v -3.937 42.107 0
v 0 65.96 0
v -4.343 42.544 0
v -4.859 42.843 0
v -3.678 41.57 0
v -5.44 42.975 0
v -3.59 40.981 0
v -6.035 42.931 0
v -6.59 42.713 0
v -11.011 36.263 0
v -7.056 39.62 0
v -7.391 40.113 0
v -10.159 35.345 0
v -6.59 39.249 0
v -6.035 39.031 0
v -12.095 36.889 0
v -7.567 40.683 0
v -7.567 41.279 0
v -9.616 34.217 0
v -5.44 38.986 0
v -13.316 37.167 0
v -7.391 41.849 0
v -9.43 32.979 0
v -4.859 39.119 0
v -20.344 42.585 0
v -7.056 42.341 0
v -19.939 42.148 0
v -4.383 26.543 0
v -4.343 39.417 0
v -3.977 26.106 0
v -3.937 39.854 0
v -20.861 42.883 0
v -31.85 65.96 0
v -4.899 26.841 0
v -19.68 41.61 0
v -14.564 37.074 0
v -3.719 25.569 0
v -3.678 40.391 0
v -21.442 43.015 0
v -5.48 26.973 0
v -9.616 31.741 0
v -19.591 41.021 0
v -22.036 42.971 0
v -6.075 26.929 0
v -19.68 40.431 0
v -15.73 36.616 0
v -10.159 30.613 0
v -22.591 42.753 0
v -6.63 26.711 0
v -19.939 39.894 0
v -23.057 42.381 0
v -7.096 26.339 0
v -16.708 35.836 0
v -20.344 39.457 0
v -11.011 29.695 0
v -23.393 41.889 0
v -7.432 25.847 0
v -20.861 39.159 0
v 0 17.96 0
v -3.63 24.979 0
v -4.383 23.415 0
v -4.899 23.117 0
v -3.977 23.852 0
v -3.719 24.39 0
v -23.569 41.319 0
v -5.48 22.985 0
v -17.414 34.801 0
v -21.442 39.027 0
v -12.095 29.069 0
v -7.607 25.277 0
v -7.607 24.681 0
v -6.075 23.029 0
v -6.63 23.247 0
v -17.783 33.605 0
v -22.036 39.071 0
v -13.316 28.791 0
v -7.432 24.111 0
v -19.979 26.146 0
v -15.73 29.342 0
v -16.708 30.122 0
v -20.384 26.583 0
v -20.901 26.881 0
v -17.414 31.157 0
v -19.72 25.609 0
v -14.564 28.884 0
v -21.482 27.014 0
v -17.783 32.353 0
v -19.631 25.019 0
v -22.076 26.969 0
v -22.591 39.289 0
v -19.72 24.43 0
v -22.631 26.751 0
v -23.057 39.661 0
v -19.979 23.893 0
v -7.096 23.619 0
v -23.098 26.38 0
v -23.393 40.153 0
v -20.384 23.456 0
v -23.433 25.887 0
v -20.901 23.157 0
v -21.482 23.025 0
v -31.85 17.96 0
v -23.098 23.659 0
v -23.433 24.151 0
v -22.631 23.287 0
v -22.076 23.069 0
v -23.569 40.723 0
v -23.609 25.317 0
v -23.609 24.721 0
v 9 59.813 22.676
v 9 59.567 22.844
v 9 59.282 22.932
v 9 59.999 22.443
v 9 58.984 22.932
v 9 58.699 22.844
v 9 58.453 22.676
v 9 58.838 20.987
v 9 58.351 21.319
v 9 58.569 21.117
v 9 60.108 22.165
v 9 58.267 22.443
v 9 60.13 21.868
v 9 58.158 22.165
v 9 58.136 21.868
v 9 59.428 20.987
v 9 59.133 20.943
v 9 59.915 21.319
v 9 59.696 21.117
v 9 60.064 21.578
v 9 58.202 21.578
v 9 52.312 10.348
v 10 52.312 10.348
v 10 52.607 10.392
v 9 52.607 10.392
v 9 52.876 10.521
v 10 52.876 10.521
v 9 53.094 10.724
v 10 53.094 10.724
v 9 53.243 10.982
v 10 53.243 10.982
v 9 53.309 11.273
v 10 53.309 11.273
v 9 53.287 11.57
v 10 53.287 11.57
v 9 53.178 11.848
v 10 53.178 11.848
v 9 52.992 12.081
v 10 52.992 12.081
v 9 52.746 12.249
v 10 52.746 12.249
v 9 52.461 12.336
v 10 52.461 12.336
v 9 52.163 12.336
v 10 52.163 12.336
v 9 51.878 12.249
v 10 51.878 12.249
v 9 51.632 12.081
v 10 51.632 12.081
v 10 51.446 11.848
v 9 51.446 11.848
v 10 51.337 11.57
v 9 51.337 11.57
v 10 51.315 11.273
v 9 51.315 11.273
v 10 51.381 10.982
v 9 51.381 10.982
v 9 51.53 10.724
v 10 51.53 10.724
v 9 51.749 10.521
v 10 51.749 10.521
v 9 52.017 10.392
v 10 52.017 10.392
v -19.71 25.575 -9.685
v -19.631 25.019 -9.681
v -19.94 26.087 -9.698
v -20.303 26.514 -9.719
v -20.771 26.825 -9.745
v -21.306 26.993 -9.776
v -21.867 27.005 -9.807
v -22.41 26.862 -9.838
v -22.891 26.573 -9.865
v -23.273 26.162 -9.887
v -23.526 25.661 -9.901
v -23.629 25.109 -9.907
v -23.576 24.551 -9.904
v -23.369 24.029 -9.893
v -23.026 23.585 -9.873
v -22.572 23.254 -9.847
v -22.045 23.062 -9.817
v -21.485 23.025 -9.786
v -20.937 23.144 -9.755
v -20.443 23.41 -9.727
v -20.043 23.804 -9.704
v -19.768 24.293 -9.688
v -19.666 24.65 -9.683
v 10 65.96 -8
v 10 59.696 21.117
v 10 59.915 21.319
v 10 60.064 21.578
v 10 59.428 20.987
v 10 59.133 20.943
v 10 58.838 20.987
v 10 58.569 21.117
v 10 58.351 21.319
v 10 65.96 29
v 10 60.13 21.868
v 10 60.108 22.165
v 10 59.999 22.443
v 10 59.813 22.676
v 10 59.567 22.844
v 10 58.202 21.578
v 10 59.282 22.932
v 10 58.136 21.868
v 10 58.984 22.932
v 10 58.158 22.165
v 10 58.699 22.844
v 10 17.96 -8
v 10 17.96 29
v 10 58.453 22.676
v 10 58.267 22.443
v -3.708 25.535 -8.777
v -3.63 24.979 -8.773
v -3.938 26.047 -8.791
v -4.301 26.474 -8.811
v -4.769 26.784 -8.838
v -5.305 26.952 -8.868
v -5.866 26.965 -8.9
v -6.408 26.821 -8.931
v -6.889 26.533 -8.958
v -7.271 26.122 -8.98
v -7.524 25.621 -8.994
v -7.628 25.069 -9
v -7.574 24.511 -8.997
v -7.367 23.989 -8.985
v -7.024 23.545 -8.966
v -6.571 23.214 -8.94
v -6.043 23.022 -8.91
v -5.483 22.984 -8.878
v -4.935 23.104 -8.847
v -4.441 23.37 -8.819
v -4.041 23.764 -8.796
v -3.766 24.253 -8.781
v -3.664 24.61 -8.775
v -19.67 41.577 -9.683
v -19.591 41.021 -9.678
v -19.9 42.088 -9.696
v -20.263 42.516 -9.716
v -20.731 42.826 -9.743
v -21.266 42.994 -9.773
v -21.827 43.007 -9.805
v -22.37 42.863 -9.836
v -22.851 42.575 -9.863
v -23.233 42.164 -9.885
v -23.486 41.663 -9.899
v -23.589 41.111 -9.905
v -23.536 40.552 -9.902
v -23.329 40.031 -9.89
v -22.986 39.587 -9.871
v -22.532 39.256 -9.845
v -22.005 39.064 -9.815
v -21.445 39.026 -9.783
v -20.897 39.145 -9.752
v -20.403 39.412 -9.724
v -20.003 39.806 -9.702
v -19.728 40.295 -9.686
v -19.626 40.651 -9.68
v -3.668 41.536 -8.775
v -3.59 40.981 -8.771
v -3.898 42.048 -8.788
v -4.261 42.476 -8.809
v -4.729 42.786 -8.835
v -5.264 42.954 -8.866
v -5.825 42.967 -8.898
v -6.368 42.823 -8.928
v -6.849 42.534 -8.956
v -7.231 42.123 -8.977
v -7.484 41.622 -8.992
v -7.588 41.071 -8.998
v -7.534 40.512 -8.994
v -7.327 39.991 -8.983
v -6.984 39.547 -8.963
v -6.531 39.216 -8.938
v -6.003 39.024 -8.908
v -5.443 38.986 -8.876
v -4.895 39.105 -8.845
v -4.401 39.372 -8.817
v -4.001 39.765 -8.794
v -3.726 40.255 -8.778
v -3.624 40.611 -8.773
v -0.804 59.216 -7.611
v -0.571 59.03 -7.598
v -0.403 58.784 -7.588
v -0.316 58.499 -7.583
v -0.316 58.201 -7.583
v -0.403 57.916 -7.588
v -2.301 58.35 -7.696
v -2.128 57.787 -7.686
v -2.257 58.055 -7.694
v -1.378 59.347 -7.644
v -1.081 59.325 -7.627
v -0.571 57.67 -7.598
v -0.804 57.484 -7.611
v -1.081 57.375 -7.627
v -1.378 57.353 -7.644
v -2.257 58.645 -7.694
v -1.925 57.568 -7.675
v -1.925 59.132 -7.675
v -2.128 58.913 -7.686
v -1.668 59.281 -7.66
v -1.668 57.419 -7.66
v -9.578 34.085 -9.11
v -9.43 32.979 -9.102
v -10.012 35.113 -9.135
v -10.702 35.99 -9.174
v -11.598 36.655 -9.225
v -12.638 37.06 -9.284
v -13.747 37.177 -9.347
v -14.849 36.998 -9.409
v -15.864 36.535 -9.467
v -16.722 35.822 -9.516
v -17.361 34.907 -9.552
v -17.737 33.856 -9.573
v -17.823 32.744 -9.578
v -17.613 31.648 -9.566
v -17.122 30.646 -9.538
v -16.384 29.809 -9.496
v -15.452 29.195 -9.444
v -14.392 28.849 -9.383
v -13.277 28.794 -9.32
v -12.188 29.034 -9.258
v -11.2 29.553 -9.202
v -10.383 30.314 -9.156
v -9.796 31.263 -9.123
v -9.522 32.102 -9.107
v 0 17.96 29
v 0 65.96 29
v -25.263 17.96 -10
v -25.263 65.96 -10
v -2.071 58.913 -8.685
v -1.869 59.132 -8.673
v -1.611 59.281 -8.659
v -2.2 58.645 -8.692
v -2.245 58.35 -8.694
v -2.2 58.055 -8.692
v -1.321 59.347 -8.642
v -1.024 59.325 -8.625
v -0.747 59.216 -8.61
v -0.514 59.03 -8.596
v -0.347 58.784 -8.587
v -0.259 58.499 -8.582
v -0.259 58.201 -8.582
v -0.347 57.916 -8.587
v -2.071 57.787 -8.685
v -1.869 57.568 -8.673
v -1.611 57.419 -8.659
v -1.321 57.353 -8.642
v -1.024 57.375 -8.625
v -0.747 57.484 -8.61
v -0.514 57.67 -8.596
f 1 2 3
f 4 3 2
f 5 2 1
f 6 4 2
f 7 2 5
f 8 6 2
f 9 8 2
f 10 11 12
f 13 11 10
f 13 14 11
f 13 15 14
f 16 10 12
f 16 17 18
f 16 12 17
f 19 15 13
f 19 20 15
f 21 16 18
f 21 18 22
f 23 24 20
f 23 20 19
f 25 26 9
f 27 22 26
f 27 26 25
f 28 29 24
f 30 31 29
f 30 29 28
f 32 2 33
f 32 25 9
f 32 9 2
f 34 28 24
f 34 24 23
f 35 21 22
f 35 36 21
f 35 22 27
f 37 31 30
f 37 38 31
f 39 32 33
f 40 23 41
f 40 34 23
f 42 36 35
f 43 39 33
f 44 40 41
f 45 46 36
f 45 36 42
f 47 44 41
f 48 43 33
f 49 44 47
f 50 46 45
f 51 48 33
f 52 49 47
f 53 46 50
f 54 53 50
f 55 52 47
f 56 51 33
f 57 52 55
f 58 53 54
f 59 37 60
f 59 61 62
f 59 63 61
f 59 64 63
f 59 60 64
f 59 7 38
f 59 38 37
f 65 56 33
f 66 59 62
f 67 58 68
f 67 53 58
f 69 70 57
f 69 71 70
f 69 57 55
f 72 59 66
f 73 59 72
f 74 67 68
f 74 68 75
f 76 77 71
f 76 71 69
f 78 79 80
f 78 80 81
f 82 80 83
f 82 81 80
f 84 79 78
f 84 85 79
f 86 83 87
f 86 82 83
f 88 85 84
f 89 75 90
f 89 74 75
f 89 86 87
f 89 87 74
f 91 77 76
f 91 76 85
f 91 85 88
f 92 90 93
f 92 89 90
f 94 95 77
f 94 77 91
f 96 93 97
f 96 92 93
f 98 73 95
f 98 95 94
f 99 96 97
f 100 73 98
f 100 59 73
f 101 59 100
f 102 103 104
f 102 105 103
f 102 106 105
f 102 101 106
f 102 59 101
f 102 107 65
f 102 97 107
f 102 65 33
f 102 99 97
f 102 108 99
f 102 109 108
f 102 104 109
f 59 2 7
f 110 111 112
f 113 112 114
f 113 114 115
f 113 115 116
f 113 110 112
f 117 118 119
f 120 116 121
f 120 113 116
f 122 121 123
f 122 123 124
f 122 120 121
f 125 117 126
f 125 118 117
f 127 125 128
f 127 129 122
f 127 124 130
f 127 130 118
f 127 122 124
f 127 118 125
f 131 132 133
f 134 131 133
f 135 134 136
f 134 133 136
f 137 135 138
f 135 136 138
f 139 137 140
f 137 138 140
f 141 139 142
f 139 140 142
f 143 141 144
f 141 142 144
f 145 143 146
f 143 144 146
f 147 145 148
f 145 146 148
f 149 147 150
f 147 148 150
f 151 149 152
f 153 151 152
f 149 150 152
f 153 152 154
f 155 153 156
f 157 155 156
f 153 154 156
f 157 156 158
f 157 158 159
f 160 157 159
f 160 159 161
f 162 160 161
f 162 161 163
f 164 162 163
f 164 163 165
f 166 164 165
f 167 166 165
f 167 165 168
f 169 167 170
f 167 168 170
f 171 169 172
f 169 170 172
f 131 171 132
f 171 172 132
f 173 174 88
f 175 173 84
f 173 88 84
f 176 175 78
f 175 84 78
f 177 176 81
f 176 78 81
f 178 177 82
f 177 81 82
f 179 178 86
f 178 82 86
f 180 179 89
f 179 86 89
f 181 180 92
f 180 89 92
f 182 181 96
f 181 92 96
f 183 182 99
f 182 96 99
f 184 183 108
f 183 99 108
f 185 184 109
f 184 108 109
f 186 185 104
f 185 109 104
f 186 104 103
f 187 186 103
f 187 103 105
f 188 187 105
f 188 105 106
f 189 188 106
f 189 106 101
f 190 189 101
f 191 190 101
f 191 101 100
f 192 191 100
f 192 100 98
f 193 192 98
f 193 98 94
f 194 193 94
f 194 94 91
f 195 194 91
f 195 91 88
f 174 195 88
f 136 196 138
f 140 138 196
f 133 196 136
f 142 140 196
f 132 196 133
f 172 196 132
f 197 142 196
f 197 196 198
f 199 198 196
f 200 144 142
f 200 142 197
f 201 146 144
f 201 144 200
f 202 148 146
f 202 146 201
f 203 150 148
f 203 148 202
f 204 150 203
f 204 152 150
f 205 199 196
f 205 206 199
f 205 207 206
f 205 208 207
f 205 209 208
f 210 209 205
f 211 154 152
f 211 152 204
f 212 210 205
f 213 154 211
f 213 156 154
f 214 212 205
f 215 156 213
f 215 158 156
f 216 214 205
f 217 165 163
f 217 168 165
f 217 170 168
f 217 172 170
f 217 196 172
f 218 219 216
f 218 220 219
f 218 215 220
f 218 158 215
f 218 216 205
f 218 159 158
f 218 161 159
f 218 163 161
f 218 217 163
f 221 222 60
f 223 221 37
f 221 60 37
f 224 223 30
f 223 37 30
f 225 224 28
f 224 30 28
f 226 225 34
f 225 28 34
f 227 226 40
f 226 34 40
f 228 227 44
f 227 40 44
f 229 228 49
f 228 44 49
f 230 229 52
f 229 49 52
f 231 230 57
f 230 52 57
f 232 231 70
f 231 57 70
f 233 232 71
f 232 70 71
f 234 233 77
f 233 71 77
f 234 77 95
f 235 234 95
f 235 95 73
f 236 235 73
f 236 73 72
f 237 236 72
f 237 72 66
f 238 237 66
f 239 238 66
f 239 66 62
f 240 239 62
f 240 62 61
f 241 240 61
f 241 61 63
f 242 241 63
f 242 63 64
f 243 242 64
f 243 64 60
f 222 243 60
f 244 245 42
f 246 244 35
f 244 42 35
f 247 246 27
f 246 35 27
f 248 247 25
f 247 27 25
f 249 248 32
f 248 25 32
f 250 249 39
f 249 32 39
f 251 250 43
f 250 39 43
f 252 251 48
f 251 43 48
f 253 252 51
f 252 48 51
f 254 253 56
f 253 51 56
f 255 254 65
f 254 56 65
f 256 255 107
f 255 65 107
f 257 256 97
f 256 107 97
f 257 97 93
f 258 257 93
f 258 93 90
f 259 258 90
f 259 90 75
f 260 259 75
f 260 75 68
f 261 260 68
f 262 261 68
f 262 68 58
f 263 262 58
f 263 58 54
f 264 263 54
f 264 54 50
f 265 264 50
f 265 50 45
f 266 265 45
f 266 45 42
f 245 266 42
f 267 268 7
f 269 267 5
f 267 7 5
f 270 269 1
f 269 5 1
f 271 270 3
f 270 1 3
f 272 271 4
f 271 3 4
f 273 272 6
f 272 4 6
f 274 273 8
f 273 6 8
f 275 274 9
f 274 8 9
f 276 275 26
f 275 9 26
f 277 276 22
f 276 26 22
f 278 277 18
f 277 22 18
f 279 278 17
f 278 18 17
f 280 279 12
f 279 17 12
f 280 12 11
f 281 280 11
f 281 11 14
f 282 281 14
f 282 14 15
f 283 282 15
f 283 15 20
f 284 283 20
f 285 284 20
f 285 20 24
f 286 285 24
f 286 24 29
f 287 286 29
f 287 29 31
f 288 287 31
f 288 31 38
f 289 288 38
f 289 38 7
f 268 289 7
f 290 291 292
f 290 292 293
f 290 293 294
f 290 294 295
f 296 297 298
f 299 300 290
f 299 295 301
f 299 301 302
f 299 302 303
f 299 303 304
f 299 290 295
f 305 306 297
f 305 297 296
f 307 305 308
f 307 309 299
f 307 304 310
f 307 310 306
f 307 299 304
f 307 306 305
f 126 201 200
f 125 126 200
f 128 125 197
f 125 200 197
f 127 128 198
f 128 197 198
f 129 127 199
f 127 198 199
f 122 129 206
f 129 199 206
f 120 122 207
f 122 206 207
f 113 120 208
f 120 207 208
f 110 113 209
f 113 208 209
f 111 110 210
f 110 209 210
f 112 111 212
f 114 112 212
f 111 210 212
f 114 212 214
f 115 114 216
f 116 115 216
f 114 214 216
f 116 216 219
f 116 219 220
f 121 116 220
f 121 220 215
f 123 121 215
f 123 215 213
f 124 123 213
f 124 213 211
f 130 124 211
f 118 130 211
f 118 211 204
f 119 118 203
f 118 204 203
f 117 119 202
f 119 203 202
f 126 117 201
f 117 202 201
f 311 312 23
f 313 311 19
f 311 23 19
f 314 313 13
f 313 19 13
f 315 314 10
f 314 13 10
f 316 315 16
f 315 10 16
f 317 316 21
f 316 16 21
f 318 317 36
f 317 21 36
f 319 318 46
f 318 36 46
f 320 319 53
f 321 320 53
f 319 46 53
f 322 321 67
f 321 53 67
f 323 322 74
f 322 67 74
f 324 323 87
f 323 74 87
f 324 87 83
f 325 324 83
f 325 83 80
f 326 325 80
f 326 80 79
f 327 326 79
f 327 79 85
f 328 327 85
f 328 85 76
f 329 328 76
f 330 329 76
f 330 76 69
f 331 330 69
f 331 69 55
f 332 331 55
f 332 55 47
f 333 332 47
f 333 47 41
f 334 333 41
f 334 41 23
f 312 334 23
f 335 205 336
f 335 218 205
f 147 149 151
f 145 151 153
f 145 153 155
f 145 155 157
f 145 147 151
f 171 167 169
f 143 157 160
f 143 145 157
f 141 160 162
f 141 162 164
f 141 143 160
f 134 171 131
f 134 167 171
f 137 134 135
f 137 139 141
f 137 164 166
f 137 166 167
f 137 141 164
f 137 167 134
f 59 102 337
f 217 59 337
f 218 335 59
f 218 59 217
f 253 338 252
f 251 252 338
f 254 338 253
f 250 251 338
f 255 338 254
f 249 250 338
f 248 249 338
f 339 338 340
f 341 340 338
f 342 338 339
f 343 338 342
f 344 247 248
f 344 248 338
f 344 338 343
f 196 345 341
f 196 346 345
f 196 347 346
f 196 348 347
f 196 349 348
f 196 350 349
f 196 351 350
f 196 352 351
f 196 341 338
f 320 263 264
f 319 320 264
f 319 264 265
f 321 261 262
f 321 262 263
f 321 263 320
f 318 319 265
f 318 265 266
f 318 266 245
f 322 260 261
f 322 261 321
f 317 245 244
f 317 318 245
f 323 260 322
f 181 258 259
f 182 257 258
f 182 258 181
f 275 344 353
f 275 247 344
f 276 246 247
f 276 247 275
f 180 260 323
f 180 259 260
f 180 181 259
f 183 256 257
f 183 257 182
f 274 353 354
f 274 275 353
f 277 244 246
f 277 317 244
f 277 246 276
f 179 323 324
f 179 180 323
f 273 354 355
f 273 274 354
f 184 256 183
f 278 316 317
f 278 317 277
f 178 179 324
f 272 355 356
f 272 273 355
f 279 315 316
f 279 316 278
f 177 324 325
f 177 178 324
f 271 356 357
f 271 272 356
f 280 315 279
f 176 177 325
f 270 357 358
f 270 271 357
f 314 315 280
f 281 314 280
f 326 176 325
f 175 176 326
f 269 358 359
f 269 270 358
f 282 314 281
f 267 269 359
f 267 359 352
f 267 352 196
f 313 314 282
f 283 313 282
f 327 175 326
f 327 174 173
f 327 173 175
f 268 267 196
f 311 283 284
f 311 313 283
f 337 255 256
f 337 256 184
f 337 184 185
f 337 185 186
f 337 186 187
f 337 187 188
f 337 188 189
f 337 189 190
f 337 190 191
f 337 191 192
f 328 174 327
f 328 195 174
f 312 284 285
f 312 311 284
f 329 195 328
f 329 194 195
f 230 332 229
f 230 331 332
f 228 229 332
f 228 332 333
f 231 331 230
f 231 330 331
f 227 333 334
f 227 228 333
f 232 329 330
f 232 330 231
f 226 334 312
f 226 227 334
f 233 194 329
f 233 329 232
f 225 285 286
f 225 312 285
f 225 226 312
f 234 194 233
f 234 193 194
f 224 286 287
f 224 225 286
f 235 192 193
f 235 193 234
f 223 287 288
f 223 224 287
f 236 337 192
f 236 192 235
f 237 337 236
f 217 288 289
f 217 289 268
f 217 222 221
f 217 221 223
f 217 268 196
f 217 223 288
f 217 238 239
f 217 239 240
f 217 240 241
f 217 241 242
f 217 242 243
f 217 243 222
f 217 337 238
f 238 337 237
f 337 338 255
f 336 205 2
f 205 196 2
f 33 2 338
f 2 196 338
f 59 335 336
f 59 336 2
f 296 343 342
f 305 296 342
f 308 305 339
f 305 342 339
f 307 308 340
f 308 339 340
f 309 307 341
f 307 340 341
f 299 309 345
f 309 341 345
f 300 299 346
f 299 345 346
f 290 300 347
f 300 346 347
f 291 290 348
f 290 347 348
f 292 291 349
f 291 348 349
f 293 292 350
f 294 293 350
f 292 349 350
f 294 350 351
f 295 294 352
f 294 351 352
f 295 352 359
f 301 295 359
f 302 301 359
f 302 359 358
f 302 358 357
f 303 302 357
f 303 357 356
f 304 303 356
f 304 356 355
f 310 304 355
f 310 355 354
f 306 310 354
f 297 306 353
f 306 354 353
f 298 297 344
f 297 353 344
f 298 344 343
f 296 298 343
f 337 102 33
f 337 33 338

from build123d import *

# Parameters (mm, degrees)
SKETCH1_W           = 41.85
SKETCH1_H           = 10
SKETCH1_W_2         = 10
SKETCH1_H_2         = 29
BOSS_EXTRUDE1_DEPTH = 48
CUT_EXTRUDE1_DEPTH  = 48
SKETCH4_R           = 2
SKETCH4_R_2         = 4.2
CUT_EXTRUDE2_DEPTH  = 48
CUT_EXTRUDE3_DEPTH  = 48
SKETCH6_R           = 1
CUT_EXTRUDE4_DEPTH  = 2
SKETCH7_R           = 1
CUT_EXTRUDE5_DEPTH  = 1
SKETCH8_W           = 65.86504954
SKETCH8_H           = 108.734415267
CUT_EXTRUDE6_DEPTH  = 17.96
BOSS_EXTRUDE2_DEPTH = 17.96
SKETCH10_R          = 1
CUT_EXTRUDE7_DEPTH  = 1
SKETCH11_R          = 1
CUT_EXTRUDE8_DEPTH  = 1


with BuildPart() as part:
    # Sketch1 → Boss-Extrude1 (new body)
    with BuildSketch(Plane(origin=(0, 0, 0), x_dir=(1, 0, 0), z_dir=(0, 1, 0))):
        with Locations((-10.925, 5)):
            Rectangle(SKETCH1_W, SKETCH1_H)
        with Locations((5, -14.5)):
            Rectangle(SKETCH1_W_2, SKETCH1_H_2)
    extrude(amount=BOSS_EXTRUDE1_DEPTH)

    # Sketch3 → Cut-Extrude1 (cut)
    with BuildSketch(Plane(origin=(0, 48, 0), x_dir=(1, 0, 0), z_dir=(0, 1, 0))):
        Polygon((-31.85, 10), (-25.26317425, 10), (-31.85, 0), align=None)
    extrude(amount=-CUT_EXTRUDE1_DEPTH, mode=Mode.SUBTRACT)

    # Sketch4 → Cut-Extrude2 (cut)
    with BuildSketch(Plane.XY):
        with Locations((-5.589559388, 40.980827232)):
            Circle(SKETCH4_R)
        with Locations((-5.629681083, 24.979051073)):
            Circle(SKETCH4_R)
        with Locations((-21.591335547, 41.020948927)):
            Circle(SKETCH4_R)
        with Locations((-21.631457243, 25.019172768)):
            Circle(SKETCH4_R)
        with Locations((-13.629681083, 32.979051073)):
            Circle(SKETCH4_R_2)
    extrude(amount=-CUT_EXTRUDE2_DEPTH, mode=Mode.SUBTRACT)

    # Sketch5 → Cut-Extrude3 (cut)
    with BuildSketch(Plane(origin=(0, 48, 0), x_dir=(1, 0, 0), z_dir=(0, 1, 0))):
        Polygon((-25.26317425, 10), (10, 8), (10, 10), align=None)
    extrude(amount=-CUT_EXTRUDE3_DEPTH, mode=Mode.SUBTRACT)

    # Sketch6 → Cut-Extrude4 (cut)
    with BuildSketch(Plane(origin=(10, 0, 0), x_dir=(0, 0, -1), z_dir=(1, 0, 0))):
        with Locations((-21, 6.391948522)):
            Circle(SKETCH6_R)
        with Locations((-11, 15)):
            Circle(SKETCH6_R)
    extrude(amount=-CUT_EXTRUDE4_DEPTH, mode=Mode.SUBTRACT)

    # Sketch7 → Cut-Extrude5 (cut)
    with BuildSketch(Plane(origin=(0.484340621, 0, -8.539693864), x_dir=(-0.9983954953921488, 0, -0.056625389894163713), z_dir=(0.056625389894163713, 0, -0.9983954953921488))):
        with Locations((10.469048165, 7)):
            Circle(SKETCH7_R)
    extrude(amount=-CUT_EXTRUDE5_DEPTH, mode=Mode.SUBTRACT)

    # Sketch8 → Cut-Extrude6 (cut)
    with BuildSketch(Plane.XZ):
        with Locations((-12.632558392, 5.858470362)):
            Rectangle(SKETCH8_W, SKETCH8_H)
    extrude(amount=-CUT_EXTRUDE6_DEPTH, mode=Mode.SUBTRACT)

    # Sketch9 → Boss-Extrude2 (add)
    with BuildSketch(Plane(origin=(0, 48, 0), x_dir=(1, 0, 0), z_dir=(0, 1, 0))):
        Polygon((10, -29), (0, -29), (0, 0), (-31.85, 0), (-25.26317425, 10), (10, 8), align=None)
    extrude(amount=BOSS_EXTRUDE2_DEPTH)

    # Sketch10 → Cut-Extrude7 (cut)
    with BuildSketch(Plane(origin=(10, 0, 0), x_dir=(0, 0, -1), z_dir=(1, 0, 0))):
        with Locations((-21.942879274, 59.132798009)):
            Circle(SKETCH10_R)
        with Locations((-11.347569505, 52.312182855)):
            Circle(SKETCH10_R)
    extrude(amount=-CUT_EXTRUDE7_DEPTH, mode=Mode.SUBTRACT)

    # Sketch11 → Cut-Extrude8 (cut)
    with BuildSketch(Plane(origin=(0.484340621, 0, -8.539693864), x_dir=(-0.9983954953921488, 0, -0.056625389894163713), z_dir=(0.056625389894163713, 0, -0.9983954953921488))):
        with Locations((1.733457751, 58.349902704)):
            Circle(SKETCH11_R)
    extrude(amount=-CUT_EXTRUDE8_DEPTH, mode=Mode.SUBTRACT)


solid = part.part
